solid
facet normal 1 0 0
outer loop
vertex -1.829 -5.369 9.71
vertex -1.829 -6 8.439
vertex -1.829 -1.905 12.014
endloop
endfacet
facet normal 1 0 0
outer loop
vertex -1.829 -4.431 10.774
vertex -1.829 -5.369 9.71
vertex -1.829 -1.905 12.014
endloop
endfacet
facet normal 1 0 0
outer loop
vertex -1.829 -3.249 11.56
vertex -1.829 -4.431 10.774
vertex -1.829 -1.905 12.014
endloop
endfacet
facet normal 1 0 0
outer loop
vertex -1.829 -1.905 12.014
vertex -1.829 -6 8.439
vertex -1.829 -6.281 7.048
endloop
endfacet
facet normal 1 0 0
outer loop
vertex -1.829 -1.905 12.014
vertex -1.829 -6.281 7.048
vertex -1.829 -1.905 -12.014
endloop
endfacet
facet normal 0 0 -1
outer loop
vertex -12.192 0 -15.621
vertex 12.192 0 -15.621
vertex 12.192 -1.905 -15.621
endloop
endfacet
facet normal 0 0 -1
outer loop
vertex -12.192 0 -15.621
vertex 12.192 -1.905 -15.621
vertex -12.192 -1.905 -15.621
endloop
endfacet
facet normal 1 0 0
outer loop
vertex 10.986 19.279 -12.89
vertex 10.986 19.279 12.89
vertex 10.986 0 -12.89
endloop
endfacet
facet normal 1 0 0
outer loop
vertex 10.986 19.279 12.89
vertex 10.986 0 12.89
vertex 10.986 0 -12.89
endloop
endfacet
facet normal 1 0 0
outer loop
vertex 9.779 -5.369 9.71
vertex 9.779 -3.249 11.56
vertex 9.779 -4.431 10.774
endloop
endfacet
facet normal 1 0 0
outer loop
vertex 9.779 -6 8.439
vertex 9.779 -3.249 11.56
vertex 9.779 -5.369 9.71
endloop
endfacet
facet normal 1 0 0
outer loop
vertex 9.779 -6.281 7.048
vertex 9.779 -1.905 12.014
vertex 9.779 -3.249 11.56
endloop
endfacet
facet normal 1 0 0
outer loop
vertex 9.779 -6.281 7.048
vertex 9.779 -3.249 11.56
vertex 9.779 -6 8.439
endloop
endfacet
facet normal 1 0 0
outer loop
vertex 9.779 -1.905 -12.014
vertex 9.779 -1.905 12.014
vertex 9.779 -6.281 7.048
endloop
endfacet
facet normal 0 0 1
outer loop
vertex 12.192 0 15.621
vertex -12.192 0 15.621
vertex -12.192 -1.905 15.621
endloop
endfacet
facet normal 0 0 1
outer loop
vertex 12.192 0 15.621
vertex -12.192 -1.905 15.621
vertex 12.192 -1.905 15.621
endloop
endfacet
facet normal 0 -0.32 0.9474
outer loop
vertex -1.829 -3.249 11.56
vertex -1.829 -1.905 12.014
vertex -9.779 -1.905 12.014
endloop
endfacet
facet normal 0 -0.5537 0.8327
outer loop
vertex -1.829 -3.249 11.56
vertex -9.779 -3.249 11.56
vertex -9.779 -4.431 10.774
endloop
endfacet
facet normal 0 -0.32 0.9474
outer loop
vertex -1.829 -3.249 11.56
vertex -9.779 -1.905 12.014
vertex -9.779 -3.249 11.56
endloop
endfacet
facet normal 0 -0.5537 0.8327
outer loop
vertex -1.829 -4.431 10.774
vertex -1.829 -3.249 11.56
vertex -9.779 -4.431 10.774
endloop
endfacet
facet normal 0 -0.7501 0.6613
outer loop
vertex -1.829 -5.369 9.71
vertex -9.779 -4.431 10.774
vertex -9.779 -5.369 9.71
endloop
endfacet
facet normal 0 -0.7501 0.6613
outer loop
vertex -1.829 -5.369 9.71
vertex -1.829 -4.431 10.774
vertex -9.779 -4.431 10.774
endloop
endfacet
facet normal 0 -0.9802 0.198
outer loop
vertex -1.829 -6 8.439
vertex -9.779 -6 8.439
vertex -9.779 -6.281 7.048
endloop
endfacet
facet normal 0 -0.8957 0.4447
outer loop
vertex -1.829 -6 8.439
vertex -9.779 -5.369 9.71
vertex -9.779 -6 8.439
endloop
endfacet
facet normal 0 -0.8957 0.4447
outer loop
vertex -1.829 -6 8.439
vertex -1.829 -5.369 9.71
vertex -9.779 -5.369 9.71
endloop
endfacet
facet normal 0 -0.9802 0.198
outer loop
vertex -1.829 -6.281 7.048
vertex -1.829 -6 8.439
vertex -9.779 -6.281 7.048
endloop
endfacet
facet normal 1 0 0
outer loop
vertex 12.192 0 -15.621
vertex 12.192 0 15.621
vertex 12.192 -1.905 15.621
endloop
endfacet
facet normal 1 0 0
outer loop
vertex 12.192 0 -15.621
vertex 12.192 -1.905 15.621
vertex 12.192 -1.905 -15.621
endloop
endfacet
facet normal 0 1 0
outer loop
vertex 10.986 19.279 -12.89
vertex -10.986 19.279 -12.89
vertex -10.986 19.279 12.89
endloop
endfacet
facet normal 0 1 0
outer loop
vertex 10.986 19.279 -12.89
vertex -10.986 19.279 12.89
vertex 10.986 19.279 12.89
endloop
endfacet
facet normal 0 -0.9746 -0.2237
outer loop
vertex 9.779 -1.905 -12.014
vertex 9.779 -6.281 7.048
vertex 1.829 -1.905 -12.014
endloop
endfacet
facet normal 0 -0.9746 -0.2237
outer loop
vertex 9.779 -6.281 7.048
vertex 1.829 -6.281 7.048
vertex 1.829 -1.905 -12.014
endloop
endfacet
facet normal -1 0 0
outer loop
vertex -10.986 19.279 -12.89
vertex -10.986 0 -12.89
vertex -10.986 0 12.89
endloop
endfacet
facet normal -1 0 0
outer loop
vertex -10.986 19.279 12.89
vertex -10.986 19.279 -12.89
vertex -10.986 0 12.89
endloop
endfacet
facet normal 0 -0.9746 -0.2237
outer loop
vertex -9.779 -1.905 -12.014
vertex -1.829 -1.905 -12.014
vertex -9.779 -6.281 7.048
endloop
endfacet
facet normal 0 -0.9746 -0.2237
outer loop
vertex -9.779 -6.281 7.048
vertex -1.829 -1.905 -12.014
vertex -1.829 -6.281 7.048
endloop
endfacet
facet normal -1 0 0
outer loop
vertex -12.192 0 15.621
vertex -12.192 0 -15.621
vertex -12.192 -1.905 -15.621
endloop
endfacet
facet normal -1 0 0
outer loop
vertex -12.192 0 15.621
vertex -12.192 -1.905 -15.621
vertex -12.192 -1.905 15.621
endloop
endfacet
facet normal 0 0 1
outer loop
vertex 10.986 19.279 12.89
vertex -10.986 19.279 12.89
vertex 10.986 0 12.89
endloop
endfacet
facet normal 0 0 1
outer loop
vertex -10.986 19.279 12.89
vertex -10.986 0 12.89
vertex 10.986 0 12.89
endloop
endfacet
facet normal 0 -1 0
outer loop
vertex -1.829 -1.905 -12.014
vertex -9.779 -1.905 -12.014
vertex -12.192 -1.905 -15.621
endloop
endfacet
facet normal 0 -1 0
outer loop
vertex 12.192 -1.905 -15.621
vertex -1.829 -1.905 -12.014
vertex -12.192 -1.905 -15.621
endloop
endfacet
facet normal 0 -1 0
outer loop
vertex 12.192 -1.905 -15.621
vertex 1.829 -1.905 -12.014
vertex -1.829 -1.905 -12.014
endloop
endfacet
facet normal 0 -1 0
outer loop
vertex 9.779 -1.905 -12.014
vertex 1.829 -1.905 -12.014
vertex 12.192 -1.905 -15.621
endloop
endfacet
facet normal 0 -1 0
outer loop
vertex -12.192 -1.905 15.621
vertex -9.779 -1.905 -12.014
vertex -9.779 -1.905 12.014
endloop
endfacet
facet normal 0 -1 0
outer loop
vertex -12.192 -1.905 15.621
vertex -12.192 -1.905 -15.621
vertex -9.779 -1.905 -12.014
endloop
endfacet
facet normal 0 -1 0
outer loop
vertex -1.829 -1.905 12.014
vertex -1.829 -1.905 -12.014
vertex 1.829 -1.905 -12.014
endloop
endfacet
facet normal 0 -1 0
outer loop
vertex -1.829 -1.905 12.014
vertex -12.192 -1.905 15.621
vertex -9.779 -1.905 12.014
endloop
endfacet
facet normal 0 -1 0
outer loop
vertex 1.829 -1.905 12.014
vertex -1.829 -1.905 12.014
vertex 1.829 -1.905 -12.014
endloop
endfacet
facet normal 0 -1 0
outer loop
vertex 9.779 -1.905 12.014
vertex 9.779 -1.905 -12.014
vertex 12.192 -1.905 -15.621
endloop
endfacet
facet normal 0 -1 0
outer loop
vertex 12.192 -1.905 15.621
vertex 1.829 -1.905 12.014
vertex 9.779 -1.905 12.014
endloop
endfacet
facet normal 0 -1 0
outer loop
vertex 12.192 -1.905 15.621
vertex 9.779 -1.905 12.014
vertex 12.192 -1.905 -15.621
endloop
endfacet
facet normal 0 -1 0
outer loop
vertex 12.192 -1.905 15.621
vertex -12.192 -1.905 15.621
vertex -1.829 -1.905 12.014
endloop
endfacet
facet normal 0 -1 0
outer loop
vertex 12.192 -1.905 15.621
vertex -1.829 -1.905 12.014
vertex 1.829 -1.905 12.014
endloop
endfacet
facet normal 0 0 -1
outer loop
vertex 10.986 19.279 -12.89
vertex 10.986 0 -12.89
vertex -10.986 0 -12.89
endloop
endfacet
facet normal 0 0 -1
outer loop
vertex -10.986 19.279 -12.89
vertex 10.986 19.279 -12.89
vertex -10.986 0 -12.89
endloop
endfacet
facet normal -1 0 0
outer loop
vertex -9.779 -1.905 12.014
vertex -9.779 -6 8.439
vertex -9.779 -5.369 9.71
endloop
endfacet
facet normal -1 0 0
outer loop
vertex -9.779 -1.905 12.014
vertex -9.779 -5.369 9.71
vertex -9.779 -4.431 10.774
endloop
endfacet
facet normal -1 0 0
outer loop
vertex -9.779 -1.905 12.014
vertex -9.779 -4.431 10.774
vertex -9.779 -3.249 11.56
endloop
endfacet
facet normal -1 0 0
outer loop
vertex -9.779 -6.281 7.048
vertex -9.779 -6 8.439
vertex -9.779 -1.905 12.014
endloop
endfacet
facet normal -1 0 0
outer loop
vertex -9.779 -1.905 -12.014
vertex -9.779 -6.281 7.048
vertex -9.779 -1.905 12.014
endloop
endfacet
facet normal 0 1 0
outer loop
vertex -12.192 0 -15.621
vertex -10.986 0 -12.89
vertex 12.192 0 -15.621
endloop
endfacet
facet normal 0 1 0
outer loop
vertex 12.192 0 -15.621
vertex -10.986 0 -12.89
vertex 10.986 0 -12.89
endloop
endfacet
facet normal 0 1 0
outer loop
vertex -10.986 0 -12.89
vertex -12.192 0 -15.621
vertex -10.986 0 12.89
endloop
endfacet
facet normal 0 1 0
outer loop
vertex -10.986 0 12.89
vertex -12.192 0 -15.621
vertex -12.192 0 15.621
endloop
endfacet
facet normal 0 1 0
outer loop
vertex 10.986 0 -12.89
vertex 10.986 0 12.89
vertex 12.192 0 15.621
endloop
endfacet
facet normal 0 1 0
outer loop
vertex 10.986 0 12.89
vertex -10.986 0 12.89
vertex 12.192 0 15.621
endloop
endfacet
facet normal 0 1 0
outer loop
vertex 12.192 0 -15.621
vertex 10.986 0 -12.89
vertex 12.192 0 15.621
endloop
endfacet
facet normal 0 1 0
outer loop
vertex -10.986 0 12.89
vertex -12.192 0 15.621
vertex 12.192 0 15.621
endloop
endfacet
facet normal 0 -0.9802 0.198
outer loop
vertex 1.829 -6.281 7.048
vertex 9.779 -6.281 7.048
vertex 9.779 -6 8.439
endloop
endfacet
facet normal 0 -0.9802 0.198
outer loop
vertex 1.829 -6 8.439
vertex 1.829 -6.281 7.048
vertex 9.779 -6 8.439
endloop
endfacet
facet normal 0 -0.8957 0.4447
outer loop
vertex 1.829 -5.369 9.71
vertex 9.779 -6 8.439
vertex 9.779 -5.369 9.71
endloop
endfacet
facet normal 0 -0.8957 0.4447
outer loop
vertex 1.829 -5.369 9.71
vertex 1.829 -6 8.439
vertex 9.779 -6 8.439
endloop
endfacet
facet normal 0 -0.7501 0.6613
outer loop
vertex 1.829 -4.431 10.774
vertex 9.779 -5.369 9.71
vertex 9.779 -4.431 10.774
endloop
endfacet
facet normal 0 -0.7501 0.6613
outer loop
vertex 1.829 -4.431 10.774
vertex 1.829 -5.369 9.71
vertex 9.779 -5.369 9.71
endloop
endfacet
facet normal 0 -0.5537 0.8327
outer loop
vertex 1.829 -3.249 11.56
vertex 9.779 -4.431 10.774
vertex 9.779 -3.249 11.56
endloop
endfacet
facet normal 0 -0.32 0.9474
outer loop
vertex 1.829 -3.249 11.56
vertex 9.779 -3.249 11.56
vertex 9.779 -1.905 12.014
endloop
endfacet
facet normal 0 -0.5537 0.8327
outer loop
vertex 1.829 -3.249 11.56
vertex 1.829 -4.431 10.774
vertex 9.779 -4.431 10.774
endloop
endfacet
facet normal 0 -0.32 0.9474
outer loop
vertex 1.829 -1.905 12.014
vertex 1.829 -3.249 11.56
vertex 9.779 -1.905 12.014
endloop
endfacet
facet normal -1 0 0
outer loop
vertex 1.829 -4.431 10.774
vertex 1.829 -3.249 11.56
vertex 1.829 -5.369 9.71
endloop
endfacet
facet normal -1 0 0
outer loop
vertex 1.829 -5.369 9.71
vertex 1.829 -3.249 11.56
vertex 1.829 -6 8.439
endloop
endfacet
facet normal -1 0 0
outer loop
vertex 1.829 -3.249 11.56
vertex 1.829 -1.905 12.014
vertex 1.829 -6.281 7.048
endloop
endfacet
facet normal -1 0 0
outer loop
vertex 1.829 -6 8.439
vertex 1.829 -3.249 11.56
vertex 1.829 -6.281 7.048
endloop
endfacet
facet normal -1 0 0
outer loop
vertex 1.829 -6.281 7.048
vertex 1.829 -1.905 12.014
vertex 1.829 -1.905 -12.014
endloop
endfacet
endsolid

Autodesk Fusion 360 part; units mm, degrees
sketch "Sketch1" plane through (0, 0, 0) normal (0, 1, 0) x (1, 0, 0)
  line L0 (10.9855, 12.8905) -> (-10.9855, 12.8905)
  line L1 (-10.9855, 12.8905) -> (-10.9855, -12.8905)
  line L2 (-10.9855, -12.8905) -> (10.9855, -12.8905)
  line L3 (10.9855, -12.8905) -> (10.9855, 12.8905)
  line L4 (10.9855, 12.8905) -> (-10.9855, -12.8905) construction
  line L5 (-10.9855, 12.8905) -> (10.9855, -12.8905) construction
  dimension "d1" = 21.971
  dimension "d2" = 25.781
extrude "Extrude1" add sketch "Sketch1" along normal blind 19.2786
sketch "Sketch2" plane through (0, 0, 0) normal (0, -1, 0) x (1, 0, 0)
  line L0 (10.9855, -12.8905) -> (10.9855, 12.8905)
  line L1 (10.9855, 12.8905) -> (-10.9855, 12.8905)
  line L2 (-10.9855, 12.8905) -> (-10.9855, -12.8905)
  line L3 (-10.9855, -12.8905) -> (10.9855, -12.8905)
  line L4 (12.192, -15.621) -> (-12.192, -15.621)
  line L5 (-12.192, -15.621) -> (-12.192, 15.621)
  line L6 (-12.192, 15.621) -> (12.192, 15.621)
  line L7 (12.192, 15.621) -> (12.192, -15.621)
  line L8 (12.192, -15.621) -> (-12.192, 15.621) construction
  line L9 (-12.192, -15.621) -> (12.192, 15.621) construction
  dimension "d5" = 24.384
  dimension "d6" = 31.242
extrude "Extrude2" add sketch "Sketch2" along normal blind 1.905 contours L0 L1 L2 L3 | L4 L5 L6 L7
sketch "Sketch3" plane through (0, -1.905, 0) normal (0, -1, 0) x (1, 0, 0)
  line L0 (12.192, 15.621) -> (-12.192, 15.621)
  line L1 (-12.192, 15.621) -> (-12.192, -15.621)
  line L2 (-12.192, -15.621) -> (12.192, -15.621)
  line L3 (12.192, -15.621) -> (12.192, 15.621)
  line L4 (-9.779, 12.0142) -> (-1.8288, 12.0142)
  line L5 (-1.8288, 12.0142) -> (-1.8288, -12.0142)
  line L6 (-1.8288, -12.0142) -> (-9.779, -12.0142)
  line L7 (-9.779, -12.0142) -> (-9.779, 12.0142)
  dimension "d9" = 3.6068
  dimension "d10" = 3.6068
  dimension "d11" = 2.413
  dimension "d12" = 7.9502
ref_plane "WorkPlane1" through (-1.8288, -1.905, 0) normal (-1, 0, 0) x (0, 0, -1)
sketch "Sketch5" plane through (-1.8288, -1.905, 0) normal (-1, 0, 0) x (0, 1, 0)
  line L0 (0, -12.0142) -> (0, 12.0142)
  line L1 (0, 12.0142) -> (-4.3758, -7.048)
  arc A0 (-4.3758, -7.048) -> (0, -12.0142) centre (1.0537, -6.6748) ccw
  dimension "d14" = 19.558
extrude "Extrude3" add sketch "Sketch5" along normal blind 7.9502
mirror "Mirror1" about plane through (0, 0, 0) normal (1, 0, 0) of "Extrude3"
equation "d10 = d9"
